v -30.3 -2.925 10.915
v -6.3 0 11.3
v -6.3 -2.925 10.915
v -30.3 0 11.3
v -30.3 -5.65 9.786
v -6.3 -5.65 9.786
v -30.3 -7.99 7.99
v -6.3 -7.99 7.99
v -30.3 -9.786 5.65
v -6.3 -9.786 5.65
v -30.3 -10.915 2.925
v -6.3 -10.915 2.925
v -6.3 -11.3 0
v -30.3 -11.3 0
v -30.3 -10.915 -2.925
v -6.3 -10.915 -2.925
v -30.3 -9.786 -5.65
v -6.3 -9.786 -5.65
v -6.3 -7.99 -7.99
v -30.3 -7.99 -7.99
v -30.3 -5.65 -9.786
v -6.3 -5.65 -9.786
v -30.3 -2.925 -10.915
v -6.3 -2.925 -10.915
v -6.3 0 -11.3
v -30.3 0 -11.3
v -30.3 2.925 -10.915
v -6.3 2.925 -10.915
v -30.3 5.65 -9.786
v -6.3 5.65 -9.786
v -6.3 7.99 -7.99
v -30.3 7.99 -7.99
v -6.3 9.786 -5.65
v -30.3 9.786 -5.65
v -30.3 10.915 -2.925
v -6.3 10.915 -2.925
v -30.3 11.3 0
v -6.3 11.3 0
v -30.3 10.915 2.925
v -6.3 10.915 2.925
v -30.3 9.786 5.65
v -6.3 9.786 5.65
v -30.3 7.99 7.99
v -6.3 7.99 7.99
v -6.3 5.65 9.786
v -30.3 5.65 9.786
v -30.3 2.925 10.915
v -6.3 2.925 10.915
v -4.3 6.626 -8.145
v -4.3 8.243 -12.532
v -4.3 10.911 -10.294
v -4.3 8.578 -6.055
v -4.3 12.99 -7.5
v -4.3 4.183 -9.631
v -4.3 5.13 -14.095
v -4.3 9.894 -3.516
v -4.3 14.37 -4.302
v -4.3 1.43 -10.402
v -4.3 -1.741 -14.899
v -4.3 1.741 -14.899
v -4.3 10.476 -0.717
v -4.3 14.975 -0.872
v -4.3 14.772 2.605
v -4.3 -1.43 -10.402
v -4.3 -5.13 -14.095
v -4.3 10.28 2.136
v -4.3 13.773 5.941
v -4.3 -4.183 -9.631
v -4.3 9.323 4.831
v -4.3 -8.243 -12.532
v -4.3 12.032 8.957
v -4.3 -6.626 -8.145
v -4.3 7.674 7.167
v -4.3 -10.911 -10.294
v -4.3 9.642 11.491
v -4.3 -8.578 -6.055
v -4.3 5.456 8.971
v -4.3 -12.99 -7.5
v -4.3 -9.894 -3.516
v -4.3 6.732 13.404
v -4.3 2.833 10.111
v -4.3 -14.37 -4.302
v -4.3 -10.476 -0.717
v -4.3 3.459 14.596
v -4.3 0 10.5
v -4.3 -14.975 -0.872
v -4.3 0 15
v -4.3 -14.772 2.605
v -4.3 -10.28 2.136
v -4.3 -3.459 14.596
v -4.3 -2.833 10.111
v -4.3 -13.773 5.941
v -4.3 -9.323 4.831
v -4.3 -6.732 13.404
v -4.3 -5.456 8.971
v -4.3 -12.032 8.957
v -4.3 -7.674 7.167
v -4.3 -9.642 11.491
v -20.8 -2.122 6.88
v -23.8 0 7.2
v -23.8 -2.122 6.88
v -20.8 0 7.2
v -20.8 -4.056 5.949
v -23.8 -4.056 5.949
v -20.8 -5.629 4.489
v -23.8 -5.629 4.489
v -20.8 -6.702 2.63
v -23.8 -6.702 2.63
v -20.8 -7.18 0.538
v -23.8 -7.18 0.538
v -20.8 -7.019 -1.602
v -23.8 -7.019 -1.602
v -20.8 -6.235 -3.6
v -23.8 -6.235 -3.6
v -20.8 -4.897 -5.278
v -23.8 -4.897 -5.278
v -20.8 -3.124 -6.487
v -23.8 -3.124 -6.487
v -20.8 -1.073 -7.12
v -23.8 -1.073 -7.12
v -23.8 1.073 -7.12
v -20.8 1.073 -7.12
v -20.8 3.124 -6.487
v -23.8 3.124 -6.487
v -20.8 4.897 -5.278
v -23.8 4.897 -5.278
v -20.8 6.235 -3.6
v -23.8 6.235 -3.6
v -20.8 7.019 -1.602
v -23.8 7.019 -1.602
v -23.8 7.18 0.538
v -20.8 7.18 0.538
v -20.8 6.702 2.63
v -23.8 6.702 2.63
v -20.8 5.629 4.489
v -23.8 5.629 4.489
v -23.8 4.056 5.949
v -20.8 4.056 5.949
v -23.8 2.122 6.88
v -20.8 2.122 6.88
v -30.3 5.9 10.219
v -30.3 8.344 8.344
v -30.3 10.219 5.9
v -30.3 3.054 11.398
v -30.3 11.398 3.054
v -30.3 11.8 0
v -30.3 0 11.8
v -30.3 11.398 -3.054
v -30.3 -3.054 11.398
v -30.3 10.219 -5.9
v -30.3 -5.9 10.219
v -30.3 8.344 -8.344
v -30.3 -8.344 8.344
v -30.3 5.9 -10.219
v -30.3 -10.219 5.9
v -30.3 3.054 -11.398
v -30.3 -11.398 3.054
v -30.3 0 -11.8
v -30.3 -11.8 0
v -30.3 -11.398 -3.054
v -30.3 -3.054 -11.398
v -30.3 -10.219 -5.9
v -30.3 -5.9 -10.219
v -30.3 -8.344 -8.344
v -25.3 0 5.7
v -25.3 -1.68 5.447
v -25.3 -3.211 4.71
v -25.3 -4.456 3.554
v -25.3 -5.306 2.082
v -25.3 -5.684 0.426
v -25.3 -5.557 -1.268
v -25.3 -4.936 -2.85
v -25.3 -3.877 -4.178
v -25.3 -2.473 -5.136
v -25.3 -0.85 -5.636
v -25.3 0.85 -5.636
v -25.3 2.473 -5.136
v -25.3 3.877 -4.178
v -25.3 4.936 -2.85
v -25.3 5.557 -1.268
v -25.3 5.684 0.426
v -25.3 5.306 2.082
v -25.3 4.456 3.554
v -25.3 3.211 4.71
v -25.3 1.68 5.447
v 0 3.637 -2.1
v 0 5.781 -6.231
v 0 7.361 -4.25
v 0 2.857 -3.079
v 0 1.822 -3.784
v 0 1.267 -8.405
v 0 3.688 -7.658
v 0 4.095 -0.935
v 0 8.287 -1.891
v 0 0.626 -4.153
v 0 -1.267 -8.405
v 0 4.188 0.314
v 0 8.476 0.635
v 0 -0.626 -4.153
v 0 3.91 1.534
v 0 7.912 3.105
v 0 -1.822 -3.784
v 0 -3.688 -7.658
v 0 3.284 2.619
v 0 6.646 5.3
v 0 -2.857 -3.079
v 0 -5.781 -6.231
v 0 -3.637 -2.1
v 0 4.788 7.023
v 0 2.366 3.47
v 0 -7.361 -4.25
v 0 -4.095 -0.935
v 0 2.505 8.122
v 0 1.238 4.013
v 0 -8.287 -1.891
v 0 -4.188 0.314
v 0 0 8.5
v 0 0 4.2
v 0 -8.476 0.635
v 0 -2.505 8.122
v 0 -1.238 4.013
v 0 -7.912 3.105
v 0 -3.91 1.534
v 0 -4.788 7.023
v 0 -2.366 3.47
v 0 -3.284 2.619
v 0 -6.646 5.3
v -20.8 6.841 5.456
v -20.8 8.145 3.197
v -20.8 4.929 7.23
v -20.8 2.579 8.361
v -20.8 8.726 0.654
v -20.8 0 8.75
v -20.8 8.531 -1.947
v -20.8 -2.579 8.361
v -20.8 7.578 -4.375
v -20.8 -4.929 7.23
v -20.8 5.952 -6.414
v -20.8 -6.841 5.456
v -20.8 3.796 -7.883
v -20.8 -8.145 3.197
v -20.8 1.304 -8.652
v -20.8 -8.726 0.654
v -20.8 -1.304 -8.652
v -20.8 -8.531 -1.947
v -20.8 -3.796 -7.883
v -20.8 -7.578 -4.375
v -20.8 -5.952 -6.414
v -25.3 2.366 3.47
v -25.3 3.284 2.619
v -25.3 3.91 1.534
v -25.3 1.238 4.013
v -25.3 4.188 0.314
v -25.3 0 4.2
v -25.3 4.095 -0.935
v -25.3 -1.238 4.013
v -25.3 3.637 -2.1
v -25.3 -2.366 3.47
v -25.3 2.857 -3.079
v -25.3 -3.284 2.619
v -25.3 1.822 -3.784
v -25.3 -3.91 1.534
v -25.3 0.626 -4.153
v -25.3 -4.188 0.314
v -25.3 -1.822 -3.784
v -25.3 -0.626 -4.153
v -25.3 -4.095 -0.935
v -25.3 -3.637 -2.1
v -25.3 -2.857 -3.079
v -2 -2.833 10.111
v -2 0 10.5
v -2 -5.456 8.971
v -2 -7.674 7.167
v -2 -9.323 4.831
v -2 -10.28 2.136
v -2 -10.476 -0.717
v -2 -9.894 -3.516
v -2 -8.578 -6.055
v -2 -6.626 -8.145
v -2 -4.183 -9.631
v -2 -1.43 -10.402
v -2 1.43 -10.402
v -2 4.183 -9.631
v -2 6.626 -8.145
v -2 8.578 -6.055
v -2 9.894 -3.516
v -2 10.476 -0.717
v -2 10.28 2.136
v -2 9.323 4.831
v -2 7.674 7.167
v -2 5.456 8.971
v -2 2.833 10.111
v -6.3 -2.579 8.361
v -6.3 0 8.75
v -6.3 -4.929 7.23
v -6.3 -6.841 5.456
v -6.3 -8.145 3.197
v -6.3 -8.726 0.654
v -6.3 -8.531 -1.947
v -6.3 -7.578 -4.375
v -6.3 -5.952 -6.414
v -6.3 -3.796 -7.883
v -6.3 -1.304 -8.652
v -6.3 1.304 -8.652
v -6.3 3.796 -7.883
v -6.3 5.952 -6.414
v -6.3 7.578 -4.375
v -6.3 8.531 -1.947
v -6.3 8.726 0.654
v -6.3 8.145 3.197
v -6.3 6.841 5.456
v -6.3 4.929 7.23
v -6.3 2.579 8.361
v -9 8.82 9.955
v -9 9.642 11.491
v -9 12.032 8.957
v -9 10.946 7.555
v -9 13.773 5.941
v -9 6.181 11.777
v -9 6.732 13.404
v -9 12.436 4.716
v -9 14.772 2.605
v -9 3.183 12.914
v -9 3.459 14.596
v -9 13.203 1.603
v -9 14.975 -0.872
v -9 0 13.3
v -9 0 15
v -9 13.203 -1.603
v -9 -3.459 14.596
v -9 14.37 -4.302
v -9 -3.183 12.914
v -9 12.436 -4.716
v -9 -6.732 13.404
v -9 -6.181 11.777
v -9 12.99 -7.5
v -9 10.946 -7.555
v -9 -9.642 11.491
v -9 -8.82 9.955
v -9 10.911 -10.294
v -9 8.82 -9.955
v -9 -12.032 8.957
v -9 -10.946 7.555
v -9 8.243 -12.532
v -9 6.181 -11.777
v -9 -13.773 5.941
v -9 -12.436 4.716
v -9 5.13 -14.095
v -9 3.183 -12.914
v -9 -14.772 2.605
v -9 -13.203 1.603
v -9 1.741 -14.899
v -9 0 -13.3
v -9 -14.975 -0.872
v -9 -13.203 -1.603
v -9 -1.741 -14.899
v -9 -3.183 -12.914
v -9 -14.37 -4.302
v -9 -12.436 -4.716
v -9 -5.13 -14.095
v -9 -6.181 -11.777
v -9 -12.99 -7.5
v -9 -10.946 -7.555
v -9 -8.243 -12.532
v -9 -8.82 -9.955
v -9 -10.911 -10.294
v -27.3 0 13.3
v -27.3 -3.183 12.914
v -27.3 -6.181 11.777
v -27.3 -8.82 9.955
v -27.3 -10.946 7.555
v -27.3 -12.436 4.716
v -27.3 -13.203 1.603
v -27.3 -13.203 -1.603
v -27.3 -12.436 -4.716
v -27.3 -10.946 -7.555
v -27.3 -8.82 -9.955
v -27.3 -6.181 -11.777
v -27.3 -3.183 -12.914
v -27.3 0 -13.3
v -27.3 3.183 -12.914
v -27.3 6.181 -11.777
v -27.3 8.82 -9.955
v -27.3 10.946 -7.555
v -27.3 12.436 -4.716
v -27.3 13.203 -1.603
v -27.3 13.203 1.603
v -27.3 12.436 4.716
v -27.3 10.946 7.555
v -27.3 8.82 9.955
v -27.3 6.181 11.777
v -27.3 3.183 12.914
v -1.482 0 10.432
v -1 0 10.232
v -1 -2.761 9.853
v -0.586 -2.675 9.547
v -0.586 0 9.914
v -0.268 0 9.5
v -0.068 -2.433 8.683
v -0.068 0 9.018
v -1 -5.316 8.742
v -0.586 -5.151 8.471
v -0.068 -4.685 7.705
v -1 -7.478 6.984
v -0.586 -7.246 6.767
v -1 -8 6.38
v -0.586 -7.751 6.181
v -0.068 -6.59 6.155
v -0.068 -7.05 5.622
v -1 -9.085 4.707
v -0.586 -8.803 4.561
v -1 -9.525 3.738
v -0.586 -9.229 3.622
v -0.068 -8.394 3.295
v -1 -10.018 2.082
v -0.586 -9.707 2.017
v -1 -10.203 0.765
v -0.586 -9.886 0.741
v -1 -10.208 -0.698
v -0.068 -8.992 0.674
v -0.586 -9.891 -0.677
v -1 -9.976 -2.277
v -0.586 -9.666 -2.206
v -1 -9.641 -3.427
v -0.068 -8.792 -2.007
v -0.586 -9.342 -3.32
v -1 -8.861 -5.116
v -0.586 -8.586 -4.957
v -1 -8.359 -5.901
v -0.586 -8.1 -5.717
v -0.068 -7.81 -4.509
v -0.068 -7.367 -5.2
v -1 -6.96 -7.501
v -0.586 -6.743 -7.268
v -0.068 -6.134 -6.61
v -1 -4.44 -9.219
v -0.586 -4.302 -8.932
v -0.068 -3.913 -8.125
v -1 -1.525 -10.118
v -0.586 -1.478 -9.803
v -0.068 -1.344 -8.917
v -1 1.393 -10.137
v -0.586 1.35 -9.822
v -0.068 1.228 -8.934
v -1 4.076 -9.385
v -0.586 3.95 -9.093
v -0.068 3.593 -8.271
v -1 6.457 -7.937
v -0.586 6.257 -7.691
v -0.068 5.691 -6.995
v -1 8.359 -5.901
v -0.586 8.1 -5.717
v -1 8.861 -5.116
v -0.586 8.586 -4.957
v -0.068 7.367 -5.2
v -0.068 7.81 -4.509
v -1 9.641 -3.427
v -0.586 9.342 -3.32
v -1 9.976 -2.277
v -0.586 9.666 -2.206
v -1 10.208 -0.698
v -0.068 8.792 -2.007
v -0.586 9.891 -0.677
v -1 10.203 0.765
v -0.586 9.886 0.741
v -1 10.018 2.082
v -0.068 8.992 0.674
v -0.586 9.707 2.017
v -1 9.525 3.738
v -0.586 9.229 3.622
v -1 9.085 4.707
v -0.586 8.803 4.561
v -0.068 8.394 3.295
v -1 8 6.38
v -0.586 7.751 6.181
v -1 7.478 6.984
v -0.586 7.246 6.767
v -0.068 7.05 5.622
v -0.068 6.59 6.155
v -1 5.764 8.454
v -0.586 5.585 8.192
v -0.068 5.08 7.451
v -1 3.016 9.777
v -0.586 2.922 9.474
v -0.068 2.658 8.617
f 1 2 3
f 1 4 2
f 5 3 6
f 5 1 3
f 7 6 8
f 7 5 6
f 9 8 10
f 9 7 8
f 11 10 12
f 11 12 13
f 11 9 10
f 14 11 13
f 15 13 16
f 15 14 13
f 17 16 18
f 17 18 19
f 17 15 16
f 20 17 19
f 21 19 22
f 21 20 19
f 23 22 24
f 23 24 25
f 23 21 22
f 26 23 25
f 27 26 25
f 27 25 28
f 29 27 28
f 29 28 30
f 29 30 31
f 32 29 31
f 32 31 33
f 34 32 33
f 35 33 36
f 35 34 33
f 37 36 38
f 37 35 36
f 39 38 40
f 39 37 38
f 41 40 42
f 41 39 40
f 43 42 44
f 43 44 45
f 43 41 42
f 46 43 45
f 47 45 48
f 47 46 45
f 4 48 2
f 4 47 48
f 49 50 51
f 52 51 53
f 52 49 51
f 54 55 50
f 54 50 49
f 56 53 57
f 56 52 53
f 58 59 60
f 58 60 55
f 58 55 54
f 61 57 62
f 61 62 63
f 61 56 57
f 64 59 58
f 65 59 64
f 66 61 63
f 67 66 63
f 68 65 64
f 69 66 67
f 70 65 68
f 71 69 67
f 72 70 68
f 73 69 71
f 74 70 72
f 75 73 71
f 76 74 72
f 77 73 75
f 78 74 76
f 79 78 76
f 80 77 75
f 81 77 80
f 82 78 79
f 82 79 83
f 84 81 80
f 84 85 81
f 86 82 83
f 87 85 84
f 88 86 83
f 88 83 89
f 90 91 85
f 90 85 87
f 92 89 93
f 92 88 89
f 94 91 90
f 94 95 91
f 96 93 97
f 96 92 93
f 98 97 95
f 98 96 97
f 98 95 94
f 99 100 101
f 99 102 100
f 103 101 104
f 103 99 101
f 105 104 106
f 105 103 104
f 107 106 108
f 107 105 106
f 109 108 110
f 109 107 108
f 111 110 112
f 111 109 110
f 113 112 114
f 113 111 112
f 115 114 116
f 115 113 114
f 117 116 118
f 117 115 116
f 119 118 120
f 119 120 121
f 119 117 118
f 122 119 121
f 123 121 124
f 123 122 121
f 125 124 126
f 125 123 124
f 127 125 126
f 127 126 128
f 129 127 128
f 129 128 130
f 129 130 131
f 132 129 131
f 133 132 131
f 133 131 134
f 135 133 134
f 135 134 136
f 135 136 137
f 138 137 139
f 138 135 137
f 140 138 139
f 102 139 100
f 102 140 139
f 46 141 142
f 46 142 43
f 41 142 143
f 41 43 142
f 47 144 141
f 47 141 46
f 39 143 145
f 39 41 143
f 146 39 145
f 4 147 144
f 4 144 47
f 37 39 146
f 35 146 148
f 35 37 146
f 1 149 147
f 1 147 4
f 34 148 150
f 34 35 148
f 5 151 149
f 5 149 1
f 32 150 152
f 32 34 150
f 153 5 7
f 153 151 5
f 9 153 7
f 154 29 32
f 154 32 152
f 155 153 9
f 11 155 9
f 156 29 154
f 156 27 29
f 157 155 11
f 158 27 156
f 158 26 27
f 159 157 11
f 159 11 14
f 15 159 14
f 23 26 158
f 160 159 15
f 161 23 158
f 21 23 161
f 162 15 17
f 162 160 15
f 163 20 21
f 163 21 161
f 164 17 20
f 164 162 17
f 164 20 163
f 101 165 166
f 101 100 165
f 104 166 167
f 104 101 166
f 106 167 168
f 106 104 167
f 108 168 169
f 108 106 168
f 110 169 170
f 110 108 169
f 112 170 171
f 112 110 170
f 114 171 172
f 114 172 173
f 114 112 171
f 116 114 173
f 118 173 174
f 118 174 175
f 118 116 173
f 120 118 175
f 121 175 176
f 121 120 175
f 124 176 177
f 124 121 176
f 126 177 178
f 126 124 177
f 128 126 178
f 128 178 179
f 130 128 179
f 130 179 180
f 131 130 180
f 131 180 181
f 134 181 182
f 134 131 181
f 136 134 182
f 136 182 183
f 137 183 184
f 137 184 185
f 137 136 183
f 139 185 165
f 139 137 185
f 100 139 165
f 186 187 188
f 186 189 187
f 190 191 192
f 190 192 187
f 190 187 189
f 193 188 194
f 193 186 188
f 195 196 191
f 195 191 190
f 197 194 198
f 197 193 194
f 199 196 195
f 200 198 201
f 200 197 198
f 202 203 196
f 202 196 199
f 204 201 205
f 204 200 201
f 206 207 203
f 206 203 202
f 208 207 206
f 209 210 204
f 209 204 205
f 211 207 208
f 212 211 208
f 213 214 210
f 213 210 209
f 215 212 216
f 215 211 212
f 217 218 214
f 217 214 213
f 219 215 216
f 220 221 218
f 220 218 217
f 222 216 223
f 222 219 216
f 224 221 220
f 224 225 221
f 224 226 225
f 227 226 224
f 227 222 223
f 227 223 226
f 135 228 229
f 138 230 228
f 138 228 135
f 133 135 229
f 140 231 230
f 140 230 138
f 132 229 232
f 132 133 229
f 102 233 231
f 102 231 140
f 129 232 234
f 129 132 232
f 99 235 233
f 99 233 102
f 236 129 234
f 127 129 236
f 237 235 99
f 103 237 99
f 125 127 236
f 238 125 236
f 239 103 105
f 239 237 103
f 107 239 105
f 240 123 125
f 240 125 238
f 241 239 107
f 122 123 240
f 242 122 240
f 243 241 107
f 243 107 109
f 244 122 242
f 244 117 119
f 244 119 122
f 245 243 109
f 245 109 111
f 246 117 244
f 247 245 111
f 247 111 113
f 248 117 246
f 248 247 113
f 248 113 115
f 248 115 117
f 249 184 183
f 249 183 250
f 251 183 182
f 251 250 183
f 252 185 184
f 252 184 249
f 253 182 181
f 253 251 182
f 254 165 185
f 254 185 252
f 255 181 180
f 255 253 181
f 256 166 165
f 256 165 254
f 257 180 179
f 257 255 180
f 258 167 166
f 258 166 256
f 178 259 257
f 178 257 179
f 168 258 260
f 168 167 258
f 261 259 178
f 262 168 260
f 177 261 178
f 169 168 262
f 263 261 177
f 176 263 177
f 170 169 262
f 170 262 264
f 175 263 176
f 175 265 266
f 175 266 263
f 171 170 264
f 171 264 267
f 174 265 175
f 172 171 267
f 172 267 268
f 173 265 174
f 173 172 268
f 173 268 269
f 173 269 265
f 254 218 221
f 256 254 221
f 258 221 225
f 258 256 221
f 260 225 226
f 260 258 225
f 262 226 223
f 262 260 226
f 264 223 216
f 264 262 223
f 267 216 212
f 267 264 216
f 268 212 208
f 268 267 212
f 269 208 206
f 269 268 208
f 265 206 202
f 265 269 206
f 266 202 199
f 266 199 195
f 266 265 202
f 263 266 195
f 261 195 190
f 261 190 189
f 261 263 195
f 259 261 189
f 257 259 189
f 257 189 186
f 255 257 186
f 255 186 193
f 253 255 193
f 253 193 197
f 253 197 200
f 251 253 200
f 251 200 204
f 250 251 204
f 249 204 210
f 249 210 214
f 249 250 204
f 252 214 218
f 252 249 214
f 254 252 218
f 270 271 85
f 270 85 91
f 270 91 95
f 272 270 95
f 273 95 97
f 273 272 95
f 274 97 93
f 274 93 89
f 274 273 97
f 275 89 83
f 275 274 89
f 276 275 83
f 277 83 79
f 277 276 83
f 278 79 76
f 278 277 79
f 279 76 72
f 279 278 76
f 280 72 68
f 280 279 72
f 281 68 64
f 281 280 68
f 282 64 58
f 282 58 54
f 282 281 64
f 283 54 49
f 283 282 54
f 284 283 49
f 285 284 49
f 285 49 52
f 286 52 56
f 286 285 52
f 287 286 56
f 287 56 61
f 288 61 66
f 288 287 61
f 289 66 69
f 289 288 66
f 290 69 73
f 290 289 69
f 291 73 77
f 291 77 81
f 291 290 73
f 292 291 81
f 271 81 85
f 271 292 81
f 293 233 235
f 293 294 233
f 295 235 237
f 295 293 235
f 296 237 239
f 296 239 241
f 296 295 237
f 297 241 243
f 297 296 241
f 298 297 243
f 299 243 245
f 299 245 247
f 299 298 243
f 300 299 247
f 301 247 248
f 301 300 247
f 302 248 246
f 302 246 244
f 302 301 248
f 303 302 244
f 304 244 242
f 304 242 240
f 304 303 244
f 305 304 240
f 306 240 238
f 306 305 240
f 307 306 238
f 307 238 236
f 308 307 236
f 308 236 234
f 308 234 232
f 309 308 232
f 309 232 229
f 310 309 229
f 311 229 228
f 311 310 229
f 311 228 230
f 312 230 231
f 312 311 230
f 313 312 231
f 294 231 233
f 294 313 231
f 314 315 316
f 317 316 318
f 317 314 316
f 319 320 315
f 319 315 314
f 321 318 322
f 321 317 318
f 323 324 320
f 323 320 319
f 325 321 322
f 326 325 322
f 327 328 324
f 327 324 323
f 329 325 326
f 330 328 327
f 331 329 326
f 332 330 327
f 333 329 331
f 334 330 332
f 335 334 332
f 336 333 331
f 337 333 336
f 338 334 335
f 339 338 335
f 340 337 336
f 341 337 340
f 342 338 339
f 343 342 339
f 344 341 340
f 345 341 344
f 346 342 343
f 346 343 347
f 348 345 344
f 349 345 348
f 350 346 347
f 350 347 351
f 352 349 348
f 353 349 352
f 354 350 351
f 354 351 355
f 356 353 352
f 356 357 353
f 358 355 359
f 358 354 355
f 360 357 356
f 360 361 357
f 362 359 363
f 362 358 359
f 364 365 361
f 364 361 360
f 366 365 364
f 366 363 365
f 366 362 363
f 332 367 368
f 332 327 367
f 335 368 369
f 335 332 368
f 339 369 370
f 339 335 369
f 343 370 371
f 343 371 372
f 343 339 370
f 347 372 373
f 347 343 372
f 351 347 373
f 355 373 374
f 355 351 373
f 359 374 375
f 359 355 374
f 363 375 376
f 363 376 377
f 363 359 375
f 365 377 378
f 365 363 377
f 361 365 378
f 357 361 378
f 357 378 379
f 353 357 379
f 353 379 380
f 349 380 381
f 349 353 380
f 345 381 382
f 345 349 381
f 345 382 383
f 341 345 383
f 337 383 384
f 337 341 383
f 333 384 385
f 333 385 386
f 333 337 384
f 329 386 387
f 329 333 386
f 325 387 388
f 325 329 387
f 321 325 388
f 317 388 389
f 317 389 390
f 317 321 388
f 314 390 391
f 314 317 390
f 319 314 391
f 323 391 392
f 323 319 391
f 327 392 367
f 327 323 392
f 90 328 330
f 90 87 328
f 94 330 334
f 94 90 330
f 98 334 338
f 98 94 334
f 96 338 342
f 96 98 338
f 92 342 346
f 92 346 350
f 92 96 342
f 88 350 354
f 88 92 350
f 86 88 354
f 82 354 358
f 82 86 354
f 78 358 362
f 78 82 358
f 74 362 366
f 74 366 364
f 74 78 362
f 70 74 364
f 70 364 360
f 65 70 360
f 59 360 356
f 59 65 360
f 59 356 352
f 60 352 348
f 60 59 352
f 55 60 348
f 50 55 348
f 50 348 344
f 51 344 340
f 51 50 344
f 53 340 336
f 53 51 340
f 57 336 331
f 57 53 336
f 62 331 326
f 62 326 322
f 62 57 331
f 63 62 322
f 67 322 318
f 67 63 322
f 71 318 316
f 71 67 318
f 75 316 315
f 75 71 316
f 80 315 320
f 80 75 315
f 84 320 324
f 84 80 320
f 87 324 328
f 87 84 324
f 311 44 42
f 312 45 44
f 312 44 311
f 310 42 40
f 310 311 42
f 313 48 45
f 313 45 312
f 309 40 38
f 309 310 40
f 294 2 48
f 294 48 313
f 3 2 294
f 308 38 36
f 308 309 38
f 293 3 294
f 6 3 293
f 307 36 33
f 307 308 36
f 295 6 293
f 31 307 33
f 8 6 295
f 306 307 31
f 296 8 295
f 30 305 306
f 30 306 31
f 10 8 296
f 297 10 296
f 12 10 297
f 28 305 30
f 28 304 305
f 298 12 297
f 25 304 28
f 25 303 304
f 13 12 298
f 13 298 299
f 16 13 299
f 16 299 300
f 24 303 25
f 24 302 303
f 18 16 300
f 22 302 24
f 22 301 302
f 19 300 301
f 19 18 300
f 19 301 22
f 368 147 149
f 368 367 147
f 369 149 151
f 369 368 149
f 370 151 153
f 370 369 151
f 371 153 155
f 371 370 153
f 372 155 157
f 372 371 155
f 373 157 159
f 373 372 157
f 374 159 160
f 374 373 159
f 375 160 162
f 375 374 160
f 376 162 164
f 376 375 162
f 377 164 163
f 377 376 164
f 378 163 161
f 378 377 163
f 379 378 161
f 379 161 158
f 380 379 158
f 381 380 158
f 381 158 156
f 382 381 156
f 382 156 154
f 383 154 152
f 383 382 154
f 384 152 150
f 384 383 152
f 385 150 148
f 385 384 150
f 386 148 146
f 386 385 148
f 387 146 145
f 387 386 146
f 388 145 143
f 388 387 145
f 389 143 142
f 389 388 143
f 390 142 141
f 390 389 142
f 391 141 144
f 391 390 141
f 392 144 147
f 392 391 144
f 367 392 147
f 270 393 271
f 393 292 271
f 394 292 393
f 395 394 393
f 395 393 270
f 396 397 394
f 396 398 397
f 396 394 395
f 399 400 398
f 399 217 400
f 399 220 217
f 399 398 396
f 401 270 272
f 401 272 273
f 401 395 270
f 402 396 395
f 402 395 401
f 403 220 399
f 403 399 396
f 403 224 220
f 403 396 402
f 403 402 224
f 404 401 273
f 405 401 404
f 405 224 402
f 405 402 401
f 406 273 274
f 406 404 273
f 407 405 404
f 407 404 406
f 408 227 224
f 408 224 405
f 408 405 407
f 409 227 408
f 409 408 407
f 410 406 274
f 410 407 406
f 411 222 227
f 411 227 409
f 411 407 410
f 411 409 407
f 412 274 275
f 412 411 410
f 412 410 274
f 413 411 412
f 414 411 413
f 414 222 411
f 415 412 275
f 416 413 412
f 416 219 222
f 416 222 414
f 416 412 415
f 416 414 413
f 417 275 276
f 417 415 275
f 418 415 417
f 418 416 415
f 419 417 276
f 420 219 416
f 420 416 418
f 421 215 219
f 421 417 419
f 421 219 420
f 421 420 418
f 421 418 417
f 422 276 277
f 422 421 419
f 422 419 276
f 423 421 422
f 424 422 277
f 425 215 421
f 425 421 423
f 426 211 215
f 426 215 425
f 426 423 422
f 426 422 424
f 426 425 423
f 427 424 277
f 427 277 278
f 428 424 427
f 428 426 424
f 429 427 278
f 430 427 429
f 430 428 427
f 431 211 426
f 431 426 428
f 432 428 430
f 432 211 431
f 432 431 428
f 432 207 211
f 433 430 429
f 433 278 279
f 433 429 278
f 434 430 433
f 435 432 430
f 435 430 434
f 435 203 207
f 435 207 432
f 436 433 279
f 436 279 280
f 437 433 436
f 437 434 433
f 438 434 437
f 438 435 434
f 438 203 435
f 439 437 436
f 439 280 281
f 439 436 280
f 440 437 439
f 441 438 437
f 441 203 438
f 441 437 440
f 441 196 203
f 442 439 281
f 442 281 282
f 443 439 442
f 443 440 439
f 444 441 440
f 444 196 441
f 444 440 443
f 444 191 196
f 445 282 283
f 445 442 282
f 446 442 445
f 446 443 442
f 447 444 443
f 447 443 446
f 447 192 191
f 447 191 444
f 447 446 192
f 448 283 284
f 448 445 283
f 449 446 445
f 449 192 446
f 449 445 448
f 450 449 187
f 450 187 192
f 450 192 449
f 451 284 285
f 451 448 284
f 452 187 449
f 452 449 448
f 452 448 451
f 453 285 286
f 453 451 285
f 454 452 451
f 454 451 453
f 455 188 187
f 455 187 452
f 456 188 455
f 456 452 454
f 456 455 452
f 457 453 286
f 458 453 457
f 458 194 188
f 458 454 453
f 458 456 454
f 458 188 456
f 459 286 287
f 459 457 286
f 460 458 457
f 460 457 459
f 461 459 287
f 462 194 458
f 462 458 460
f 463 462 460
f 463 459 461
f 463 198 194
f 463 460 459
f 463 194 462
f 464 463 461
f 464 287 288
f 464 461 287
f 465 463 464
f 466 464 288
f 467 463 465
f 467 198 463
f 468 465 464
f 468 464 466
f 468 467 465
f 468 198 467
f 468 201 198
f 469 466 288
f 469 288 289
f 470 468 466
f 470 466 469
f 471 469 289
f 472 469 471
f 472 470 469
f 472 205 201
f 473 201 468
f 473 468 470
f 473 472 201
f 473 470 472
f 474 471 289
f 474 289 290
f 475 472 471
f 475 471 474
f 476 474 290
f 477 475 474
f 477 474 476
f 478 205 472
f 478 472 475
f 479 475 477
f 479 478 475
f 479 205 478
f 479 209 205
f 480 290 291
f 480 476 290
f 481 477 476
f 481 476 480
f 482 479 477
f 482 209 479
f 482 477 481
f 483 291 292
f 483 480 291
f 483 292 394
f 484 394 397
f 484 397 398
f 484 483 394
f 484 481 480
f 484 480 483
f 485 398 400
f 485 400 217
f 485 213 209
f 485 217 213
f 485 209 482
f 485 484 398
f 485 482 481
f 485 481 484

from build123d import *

# Parameters (mm, degrees)
CONG_1_R = 2


with BuildPart() as part:
    # Esquisse1 → Révolution1 (revolve)
    with BuildSketch(Plane.XY):
        Polygon((-30.3, 11.3), (-30.3, 11.8), (-27.3, 13.3), (-9, 13.3), (-9, 15), (-4.3, 15), (-4.3, 10.5), (0, 10.5), (0, 4.2), (-25.3, 4.2), (-25.3, 5.7), (-23.8, 7.2), (-20.8, 7.2), (-20.8, 8.75), (-6.3, 8.75), (-6.3, 11.3), align=None)
    revolve(axis=Axis((-62.970585652, 0, 0), (1, 0, 0)))

    # Congé1
    cong_1_edges = [part.edges().sort_by_distance(p)[0] for p in [
        (0, -10.5, 0),
    ]]
    fillet(cong_1_edges, radius=CONG_1_R)


solid = part.part
